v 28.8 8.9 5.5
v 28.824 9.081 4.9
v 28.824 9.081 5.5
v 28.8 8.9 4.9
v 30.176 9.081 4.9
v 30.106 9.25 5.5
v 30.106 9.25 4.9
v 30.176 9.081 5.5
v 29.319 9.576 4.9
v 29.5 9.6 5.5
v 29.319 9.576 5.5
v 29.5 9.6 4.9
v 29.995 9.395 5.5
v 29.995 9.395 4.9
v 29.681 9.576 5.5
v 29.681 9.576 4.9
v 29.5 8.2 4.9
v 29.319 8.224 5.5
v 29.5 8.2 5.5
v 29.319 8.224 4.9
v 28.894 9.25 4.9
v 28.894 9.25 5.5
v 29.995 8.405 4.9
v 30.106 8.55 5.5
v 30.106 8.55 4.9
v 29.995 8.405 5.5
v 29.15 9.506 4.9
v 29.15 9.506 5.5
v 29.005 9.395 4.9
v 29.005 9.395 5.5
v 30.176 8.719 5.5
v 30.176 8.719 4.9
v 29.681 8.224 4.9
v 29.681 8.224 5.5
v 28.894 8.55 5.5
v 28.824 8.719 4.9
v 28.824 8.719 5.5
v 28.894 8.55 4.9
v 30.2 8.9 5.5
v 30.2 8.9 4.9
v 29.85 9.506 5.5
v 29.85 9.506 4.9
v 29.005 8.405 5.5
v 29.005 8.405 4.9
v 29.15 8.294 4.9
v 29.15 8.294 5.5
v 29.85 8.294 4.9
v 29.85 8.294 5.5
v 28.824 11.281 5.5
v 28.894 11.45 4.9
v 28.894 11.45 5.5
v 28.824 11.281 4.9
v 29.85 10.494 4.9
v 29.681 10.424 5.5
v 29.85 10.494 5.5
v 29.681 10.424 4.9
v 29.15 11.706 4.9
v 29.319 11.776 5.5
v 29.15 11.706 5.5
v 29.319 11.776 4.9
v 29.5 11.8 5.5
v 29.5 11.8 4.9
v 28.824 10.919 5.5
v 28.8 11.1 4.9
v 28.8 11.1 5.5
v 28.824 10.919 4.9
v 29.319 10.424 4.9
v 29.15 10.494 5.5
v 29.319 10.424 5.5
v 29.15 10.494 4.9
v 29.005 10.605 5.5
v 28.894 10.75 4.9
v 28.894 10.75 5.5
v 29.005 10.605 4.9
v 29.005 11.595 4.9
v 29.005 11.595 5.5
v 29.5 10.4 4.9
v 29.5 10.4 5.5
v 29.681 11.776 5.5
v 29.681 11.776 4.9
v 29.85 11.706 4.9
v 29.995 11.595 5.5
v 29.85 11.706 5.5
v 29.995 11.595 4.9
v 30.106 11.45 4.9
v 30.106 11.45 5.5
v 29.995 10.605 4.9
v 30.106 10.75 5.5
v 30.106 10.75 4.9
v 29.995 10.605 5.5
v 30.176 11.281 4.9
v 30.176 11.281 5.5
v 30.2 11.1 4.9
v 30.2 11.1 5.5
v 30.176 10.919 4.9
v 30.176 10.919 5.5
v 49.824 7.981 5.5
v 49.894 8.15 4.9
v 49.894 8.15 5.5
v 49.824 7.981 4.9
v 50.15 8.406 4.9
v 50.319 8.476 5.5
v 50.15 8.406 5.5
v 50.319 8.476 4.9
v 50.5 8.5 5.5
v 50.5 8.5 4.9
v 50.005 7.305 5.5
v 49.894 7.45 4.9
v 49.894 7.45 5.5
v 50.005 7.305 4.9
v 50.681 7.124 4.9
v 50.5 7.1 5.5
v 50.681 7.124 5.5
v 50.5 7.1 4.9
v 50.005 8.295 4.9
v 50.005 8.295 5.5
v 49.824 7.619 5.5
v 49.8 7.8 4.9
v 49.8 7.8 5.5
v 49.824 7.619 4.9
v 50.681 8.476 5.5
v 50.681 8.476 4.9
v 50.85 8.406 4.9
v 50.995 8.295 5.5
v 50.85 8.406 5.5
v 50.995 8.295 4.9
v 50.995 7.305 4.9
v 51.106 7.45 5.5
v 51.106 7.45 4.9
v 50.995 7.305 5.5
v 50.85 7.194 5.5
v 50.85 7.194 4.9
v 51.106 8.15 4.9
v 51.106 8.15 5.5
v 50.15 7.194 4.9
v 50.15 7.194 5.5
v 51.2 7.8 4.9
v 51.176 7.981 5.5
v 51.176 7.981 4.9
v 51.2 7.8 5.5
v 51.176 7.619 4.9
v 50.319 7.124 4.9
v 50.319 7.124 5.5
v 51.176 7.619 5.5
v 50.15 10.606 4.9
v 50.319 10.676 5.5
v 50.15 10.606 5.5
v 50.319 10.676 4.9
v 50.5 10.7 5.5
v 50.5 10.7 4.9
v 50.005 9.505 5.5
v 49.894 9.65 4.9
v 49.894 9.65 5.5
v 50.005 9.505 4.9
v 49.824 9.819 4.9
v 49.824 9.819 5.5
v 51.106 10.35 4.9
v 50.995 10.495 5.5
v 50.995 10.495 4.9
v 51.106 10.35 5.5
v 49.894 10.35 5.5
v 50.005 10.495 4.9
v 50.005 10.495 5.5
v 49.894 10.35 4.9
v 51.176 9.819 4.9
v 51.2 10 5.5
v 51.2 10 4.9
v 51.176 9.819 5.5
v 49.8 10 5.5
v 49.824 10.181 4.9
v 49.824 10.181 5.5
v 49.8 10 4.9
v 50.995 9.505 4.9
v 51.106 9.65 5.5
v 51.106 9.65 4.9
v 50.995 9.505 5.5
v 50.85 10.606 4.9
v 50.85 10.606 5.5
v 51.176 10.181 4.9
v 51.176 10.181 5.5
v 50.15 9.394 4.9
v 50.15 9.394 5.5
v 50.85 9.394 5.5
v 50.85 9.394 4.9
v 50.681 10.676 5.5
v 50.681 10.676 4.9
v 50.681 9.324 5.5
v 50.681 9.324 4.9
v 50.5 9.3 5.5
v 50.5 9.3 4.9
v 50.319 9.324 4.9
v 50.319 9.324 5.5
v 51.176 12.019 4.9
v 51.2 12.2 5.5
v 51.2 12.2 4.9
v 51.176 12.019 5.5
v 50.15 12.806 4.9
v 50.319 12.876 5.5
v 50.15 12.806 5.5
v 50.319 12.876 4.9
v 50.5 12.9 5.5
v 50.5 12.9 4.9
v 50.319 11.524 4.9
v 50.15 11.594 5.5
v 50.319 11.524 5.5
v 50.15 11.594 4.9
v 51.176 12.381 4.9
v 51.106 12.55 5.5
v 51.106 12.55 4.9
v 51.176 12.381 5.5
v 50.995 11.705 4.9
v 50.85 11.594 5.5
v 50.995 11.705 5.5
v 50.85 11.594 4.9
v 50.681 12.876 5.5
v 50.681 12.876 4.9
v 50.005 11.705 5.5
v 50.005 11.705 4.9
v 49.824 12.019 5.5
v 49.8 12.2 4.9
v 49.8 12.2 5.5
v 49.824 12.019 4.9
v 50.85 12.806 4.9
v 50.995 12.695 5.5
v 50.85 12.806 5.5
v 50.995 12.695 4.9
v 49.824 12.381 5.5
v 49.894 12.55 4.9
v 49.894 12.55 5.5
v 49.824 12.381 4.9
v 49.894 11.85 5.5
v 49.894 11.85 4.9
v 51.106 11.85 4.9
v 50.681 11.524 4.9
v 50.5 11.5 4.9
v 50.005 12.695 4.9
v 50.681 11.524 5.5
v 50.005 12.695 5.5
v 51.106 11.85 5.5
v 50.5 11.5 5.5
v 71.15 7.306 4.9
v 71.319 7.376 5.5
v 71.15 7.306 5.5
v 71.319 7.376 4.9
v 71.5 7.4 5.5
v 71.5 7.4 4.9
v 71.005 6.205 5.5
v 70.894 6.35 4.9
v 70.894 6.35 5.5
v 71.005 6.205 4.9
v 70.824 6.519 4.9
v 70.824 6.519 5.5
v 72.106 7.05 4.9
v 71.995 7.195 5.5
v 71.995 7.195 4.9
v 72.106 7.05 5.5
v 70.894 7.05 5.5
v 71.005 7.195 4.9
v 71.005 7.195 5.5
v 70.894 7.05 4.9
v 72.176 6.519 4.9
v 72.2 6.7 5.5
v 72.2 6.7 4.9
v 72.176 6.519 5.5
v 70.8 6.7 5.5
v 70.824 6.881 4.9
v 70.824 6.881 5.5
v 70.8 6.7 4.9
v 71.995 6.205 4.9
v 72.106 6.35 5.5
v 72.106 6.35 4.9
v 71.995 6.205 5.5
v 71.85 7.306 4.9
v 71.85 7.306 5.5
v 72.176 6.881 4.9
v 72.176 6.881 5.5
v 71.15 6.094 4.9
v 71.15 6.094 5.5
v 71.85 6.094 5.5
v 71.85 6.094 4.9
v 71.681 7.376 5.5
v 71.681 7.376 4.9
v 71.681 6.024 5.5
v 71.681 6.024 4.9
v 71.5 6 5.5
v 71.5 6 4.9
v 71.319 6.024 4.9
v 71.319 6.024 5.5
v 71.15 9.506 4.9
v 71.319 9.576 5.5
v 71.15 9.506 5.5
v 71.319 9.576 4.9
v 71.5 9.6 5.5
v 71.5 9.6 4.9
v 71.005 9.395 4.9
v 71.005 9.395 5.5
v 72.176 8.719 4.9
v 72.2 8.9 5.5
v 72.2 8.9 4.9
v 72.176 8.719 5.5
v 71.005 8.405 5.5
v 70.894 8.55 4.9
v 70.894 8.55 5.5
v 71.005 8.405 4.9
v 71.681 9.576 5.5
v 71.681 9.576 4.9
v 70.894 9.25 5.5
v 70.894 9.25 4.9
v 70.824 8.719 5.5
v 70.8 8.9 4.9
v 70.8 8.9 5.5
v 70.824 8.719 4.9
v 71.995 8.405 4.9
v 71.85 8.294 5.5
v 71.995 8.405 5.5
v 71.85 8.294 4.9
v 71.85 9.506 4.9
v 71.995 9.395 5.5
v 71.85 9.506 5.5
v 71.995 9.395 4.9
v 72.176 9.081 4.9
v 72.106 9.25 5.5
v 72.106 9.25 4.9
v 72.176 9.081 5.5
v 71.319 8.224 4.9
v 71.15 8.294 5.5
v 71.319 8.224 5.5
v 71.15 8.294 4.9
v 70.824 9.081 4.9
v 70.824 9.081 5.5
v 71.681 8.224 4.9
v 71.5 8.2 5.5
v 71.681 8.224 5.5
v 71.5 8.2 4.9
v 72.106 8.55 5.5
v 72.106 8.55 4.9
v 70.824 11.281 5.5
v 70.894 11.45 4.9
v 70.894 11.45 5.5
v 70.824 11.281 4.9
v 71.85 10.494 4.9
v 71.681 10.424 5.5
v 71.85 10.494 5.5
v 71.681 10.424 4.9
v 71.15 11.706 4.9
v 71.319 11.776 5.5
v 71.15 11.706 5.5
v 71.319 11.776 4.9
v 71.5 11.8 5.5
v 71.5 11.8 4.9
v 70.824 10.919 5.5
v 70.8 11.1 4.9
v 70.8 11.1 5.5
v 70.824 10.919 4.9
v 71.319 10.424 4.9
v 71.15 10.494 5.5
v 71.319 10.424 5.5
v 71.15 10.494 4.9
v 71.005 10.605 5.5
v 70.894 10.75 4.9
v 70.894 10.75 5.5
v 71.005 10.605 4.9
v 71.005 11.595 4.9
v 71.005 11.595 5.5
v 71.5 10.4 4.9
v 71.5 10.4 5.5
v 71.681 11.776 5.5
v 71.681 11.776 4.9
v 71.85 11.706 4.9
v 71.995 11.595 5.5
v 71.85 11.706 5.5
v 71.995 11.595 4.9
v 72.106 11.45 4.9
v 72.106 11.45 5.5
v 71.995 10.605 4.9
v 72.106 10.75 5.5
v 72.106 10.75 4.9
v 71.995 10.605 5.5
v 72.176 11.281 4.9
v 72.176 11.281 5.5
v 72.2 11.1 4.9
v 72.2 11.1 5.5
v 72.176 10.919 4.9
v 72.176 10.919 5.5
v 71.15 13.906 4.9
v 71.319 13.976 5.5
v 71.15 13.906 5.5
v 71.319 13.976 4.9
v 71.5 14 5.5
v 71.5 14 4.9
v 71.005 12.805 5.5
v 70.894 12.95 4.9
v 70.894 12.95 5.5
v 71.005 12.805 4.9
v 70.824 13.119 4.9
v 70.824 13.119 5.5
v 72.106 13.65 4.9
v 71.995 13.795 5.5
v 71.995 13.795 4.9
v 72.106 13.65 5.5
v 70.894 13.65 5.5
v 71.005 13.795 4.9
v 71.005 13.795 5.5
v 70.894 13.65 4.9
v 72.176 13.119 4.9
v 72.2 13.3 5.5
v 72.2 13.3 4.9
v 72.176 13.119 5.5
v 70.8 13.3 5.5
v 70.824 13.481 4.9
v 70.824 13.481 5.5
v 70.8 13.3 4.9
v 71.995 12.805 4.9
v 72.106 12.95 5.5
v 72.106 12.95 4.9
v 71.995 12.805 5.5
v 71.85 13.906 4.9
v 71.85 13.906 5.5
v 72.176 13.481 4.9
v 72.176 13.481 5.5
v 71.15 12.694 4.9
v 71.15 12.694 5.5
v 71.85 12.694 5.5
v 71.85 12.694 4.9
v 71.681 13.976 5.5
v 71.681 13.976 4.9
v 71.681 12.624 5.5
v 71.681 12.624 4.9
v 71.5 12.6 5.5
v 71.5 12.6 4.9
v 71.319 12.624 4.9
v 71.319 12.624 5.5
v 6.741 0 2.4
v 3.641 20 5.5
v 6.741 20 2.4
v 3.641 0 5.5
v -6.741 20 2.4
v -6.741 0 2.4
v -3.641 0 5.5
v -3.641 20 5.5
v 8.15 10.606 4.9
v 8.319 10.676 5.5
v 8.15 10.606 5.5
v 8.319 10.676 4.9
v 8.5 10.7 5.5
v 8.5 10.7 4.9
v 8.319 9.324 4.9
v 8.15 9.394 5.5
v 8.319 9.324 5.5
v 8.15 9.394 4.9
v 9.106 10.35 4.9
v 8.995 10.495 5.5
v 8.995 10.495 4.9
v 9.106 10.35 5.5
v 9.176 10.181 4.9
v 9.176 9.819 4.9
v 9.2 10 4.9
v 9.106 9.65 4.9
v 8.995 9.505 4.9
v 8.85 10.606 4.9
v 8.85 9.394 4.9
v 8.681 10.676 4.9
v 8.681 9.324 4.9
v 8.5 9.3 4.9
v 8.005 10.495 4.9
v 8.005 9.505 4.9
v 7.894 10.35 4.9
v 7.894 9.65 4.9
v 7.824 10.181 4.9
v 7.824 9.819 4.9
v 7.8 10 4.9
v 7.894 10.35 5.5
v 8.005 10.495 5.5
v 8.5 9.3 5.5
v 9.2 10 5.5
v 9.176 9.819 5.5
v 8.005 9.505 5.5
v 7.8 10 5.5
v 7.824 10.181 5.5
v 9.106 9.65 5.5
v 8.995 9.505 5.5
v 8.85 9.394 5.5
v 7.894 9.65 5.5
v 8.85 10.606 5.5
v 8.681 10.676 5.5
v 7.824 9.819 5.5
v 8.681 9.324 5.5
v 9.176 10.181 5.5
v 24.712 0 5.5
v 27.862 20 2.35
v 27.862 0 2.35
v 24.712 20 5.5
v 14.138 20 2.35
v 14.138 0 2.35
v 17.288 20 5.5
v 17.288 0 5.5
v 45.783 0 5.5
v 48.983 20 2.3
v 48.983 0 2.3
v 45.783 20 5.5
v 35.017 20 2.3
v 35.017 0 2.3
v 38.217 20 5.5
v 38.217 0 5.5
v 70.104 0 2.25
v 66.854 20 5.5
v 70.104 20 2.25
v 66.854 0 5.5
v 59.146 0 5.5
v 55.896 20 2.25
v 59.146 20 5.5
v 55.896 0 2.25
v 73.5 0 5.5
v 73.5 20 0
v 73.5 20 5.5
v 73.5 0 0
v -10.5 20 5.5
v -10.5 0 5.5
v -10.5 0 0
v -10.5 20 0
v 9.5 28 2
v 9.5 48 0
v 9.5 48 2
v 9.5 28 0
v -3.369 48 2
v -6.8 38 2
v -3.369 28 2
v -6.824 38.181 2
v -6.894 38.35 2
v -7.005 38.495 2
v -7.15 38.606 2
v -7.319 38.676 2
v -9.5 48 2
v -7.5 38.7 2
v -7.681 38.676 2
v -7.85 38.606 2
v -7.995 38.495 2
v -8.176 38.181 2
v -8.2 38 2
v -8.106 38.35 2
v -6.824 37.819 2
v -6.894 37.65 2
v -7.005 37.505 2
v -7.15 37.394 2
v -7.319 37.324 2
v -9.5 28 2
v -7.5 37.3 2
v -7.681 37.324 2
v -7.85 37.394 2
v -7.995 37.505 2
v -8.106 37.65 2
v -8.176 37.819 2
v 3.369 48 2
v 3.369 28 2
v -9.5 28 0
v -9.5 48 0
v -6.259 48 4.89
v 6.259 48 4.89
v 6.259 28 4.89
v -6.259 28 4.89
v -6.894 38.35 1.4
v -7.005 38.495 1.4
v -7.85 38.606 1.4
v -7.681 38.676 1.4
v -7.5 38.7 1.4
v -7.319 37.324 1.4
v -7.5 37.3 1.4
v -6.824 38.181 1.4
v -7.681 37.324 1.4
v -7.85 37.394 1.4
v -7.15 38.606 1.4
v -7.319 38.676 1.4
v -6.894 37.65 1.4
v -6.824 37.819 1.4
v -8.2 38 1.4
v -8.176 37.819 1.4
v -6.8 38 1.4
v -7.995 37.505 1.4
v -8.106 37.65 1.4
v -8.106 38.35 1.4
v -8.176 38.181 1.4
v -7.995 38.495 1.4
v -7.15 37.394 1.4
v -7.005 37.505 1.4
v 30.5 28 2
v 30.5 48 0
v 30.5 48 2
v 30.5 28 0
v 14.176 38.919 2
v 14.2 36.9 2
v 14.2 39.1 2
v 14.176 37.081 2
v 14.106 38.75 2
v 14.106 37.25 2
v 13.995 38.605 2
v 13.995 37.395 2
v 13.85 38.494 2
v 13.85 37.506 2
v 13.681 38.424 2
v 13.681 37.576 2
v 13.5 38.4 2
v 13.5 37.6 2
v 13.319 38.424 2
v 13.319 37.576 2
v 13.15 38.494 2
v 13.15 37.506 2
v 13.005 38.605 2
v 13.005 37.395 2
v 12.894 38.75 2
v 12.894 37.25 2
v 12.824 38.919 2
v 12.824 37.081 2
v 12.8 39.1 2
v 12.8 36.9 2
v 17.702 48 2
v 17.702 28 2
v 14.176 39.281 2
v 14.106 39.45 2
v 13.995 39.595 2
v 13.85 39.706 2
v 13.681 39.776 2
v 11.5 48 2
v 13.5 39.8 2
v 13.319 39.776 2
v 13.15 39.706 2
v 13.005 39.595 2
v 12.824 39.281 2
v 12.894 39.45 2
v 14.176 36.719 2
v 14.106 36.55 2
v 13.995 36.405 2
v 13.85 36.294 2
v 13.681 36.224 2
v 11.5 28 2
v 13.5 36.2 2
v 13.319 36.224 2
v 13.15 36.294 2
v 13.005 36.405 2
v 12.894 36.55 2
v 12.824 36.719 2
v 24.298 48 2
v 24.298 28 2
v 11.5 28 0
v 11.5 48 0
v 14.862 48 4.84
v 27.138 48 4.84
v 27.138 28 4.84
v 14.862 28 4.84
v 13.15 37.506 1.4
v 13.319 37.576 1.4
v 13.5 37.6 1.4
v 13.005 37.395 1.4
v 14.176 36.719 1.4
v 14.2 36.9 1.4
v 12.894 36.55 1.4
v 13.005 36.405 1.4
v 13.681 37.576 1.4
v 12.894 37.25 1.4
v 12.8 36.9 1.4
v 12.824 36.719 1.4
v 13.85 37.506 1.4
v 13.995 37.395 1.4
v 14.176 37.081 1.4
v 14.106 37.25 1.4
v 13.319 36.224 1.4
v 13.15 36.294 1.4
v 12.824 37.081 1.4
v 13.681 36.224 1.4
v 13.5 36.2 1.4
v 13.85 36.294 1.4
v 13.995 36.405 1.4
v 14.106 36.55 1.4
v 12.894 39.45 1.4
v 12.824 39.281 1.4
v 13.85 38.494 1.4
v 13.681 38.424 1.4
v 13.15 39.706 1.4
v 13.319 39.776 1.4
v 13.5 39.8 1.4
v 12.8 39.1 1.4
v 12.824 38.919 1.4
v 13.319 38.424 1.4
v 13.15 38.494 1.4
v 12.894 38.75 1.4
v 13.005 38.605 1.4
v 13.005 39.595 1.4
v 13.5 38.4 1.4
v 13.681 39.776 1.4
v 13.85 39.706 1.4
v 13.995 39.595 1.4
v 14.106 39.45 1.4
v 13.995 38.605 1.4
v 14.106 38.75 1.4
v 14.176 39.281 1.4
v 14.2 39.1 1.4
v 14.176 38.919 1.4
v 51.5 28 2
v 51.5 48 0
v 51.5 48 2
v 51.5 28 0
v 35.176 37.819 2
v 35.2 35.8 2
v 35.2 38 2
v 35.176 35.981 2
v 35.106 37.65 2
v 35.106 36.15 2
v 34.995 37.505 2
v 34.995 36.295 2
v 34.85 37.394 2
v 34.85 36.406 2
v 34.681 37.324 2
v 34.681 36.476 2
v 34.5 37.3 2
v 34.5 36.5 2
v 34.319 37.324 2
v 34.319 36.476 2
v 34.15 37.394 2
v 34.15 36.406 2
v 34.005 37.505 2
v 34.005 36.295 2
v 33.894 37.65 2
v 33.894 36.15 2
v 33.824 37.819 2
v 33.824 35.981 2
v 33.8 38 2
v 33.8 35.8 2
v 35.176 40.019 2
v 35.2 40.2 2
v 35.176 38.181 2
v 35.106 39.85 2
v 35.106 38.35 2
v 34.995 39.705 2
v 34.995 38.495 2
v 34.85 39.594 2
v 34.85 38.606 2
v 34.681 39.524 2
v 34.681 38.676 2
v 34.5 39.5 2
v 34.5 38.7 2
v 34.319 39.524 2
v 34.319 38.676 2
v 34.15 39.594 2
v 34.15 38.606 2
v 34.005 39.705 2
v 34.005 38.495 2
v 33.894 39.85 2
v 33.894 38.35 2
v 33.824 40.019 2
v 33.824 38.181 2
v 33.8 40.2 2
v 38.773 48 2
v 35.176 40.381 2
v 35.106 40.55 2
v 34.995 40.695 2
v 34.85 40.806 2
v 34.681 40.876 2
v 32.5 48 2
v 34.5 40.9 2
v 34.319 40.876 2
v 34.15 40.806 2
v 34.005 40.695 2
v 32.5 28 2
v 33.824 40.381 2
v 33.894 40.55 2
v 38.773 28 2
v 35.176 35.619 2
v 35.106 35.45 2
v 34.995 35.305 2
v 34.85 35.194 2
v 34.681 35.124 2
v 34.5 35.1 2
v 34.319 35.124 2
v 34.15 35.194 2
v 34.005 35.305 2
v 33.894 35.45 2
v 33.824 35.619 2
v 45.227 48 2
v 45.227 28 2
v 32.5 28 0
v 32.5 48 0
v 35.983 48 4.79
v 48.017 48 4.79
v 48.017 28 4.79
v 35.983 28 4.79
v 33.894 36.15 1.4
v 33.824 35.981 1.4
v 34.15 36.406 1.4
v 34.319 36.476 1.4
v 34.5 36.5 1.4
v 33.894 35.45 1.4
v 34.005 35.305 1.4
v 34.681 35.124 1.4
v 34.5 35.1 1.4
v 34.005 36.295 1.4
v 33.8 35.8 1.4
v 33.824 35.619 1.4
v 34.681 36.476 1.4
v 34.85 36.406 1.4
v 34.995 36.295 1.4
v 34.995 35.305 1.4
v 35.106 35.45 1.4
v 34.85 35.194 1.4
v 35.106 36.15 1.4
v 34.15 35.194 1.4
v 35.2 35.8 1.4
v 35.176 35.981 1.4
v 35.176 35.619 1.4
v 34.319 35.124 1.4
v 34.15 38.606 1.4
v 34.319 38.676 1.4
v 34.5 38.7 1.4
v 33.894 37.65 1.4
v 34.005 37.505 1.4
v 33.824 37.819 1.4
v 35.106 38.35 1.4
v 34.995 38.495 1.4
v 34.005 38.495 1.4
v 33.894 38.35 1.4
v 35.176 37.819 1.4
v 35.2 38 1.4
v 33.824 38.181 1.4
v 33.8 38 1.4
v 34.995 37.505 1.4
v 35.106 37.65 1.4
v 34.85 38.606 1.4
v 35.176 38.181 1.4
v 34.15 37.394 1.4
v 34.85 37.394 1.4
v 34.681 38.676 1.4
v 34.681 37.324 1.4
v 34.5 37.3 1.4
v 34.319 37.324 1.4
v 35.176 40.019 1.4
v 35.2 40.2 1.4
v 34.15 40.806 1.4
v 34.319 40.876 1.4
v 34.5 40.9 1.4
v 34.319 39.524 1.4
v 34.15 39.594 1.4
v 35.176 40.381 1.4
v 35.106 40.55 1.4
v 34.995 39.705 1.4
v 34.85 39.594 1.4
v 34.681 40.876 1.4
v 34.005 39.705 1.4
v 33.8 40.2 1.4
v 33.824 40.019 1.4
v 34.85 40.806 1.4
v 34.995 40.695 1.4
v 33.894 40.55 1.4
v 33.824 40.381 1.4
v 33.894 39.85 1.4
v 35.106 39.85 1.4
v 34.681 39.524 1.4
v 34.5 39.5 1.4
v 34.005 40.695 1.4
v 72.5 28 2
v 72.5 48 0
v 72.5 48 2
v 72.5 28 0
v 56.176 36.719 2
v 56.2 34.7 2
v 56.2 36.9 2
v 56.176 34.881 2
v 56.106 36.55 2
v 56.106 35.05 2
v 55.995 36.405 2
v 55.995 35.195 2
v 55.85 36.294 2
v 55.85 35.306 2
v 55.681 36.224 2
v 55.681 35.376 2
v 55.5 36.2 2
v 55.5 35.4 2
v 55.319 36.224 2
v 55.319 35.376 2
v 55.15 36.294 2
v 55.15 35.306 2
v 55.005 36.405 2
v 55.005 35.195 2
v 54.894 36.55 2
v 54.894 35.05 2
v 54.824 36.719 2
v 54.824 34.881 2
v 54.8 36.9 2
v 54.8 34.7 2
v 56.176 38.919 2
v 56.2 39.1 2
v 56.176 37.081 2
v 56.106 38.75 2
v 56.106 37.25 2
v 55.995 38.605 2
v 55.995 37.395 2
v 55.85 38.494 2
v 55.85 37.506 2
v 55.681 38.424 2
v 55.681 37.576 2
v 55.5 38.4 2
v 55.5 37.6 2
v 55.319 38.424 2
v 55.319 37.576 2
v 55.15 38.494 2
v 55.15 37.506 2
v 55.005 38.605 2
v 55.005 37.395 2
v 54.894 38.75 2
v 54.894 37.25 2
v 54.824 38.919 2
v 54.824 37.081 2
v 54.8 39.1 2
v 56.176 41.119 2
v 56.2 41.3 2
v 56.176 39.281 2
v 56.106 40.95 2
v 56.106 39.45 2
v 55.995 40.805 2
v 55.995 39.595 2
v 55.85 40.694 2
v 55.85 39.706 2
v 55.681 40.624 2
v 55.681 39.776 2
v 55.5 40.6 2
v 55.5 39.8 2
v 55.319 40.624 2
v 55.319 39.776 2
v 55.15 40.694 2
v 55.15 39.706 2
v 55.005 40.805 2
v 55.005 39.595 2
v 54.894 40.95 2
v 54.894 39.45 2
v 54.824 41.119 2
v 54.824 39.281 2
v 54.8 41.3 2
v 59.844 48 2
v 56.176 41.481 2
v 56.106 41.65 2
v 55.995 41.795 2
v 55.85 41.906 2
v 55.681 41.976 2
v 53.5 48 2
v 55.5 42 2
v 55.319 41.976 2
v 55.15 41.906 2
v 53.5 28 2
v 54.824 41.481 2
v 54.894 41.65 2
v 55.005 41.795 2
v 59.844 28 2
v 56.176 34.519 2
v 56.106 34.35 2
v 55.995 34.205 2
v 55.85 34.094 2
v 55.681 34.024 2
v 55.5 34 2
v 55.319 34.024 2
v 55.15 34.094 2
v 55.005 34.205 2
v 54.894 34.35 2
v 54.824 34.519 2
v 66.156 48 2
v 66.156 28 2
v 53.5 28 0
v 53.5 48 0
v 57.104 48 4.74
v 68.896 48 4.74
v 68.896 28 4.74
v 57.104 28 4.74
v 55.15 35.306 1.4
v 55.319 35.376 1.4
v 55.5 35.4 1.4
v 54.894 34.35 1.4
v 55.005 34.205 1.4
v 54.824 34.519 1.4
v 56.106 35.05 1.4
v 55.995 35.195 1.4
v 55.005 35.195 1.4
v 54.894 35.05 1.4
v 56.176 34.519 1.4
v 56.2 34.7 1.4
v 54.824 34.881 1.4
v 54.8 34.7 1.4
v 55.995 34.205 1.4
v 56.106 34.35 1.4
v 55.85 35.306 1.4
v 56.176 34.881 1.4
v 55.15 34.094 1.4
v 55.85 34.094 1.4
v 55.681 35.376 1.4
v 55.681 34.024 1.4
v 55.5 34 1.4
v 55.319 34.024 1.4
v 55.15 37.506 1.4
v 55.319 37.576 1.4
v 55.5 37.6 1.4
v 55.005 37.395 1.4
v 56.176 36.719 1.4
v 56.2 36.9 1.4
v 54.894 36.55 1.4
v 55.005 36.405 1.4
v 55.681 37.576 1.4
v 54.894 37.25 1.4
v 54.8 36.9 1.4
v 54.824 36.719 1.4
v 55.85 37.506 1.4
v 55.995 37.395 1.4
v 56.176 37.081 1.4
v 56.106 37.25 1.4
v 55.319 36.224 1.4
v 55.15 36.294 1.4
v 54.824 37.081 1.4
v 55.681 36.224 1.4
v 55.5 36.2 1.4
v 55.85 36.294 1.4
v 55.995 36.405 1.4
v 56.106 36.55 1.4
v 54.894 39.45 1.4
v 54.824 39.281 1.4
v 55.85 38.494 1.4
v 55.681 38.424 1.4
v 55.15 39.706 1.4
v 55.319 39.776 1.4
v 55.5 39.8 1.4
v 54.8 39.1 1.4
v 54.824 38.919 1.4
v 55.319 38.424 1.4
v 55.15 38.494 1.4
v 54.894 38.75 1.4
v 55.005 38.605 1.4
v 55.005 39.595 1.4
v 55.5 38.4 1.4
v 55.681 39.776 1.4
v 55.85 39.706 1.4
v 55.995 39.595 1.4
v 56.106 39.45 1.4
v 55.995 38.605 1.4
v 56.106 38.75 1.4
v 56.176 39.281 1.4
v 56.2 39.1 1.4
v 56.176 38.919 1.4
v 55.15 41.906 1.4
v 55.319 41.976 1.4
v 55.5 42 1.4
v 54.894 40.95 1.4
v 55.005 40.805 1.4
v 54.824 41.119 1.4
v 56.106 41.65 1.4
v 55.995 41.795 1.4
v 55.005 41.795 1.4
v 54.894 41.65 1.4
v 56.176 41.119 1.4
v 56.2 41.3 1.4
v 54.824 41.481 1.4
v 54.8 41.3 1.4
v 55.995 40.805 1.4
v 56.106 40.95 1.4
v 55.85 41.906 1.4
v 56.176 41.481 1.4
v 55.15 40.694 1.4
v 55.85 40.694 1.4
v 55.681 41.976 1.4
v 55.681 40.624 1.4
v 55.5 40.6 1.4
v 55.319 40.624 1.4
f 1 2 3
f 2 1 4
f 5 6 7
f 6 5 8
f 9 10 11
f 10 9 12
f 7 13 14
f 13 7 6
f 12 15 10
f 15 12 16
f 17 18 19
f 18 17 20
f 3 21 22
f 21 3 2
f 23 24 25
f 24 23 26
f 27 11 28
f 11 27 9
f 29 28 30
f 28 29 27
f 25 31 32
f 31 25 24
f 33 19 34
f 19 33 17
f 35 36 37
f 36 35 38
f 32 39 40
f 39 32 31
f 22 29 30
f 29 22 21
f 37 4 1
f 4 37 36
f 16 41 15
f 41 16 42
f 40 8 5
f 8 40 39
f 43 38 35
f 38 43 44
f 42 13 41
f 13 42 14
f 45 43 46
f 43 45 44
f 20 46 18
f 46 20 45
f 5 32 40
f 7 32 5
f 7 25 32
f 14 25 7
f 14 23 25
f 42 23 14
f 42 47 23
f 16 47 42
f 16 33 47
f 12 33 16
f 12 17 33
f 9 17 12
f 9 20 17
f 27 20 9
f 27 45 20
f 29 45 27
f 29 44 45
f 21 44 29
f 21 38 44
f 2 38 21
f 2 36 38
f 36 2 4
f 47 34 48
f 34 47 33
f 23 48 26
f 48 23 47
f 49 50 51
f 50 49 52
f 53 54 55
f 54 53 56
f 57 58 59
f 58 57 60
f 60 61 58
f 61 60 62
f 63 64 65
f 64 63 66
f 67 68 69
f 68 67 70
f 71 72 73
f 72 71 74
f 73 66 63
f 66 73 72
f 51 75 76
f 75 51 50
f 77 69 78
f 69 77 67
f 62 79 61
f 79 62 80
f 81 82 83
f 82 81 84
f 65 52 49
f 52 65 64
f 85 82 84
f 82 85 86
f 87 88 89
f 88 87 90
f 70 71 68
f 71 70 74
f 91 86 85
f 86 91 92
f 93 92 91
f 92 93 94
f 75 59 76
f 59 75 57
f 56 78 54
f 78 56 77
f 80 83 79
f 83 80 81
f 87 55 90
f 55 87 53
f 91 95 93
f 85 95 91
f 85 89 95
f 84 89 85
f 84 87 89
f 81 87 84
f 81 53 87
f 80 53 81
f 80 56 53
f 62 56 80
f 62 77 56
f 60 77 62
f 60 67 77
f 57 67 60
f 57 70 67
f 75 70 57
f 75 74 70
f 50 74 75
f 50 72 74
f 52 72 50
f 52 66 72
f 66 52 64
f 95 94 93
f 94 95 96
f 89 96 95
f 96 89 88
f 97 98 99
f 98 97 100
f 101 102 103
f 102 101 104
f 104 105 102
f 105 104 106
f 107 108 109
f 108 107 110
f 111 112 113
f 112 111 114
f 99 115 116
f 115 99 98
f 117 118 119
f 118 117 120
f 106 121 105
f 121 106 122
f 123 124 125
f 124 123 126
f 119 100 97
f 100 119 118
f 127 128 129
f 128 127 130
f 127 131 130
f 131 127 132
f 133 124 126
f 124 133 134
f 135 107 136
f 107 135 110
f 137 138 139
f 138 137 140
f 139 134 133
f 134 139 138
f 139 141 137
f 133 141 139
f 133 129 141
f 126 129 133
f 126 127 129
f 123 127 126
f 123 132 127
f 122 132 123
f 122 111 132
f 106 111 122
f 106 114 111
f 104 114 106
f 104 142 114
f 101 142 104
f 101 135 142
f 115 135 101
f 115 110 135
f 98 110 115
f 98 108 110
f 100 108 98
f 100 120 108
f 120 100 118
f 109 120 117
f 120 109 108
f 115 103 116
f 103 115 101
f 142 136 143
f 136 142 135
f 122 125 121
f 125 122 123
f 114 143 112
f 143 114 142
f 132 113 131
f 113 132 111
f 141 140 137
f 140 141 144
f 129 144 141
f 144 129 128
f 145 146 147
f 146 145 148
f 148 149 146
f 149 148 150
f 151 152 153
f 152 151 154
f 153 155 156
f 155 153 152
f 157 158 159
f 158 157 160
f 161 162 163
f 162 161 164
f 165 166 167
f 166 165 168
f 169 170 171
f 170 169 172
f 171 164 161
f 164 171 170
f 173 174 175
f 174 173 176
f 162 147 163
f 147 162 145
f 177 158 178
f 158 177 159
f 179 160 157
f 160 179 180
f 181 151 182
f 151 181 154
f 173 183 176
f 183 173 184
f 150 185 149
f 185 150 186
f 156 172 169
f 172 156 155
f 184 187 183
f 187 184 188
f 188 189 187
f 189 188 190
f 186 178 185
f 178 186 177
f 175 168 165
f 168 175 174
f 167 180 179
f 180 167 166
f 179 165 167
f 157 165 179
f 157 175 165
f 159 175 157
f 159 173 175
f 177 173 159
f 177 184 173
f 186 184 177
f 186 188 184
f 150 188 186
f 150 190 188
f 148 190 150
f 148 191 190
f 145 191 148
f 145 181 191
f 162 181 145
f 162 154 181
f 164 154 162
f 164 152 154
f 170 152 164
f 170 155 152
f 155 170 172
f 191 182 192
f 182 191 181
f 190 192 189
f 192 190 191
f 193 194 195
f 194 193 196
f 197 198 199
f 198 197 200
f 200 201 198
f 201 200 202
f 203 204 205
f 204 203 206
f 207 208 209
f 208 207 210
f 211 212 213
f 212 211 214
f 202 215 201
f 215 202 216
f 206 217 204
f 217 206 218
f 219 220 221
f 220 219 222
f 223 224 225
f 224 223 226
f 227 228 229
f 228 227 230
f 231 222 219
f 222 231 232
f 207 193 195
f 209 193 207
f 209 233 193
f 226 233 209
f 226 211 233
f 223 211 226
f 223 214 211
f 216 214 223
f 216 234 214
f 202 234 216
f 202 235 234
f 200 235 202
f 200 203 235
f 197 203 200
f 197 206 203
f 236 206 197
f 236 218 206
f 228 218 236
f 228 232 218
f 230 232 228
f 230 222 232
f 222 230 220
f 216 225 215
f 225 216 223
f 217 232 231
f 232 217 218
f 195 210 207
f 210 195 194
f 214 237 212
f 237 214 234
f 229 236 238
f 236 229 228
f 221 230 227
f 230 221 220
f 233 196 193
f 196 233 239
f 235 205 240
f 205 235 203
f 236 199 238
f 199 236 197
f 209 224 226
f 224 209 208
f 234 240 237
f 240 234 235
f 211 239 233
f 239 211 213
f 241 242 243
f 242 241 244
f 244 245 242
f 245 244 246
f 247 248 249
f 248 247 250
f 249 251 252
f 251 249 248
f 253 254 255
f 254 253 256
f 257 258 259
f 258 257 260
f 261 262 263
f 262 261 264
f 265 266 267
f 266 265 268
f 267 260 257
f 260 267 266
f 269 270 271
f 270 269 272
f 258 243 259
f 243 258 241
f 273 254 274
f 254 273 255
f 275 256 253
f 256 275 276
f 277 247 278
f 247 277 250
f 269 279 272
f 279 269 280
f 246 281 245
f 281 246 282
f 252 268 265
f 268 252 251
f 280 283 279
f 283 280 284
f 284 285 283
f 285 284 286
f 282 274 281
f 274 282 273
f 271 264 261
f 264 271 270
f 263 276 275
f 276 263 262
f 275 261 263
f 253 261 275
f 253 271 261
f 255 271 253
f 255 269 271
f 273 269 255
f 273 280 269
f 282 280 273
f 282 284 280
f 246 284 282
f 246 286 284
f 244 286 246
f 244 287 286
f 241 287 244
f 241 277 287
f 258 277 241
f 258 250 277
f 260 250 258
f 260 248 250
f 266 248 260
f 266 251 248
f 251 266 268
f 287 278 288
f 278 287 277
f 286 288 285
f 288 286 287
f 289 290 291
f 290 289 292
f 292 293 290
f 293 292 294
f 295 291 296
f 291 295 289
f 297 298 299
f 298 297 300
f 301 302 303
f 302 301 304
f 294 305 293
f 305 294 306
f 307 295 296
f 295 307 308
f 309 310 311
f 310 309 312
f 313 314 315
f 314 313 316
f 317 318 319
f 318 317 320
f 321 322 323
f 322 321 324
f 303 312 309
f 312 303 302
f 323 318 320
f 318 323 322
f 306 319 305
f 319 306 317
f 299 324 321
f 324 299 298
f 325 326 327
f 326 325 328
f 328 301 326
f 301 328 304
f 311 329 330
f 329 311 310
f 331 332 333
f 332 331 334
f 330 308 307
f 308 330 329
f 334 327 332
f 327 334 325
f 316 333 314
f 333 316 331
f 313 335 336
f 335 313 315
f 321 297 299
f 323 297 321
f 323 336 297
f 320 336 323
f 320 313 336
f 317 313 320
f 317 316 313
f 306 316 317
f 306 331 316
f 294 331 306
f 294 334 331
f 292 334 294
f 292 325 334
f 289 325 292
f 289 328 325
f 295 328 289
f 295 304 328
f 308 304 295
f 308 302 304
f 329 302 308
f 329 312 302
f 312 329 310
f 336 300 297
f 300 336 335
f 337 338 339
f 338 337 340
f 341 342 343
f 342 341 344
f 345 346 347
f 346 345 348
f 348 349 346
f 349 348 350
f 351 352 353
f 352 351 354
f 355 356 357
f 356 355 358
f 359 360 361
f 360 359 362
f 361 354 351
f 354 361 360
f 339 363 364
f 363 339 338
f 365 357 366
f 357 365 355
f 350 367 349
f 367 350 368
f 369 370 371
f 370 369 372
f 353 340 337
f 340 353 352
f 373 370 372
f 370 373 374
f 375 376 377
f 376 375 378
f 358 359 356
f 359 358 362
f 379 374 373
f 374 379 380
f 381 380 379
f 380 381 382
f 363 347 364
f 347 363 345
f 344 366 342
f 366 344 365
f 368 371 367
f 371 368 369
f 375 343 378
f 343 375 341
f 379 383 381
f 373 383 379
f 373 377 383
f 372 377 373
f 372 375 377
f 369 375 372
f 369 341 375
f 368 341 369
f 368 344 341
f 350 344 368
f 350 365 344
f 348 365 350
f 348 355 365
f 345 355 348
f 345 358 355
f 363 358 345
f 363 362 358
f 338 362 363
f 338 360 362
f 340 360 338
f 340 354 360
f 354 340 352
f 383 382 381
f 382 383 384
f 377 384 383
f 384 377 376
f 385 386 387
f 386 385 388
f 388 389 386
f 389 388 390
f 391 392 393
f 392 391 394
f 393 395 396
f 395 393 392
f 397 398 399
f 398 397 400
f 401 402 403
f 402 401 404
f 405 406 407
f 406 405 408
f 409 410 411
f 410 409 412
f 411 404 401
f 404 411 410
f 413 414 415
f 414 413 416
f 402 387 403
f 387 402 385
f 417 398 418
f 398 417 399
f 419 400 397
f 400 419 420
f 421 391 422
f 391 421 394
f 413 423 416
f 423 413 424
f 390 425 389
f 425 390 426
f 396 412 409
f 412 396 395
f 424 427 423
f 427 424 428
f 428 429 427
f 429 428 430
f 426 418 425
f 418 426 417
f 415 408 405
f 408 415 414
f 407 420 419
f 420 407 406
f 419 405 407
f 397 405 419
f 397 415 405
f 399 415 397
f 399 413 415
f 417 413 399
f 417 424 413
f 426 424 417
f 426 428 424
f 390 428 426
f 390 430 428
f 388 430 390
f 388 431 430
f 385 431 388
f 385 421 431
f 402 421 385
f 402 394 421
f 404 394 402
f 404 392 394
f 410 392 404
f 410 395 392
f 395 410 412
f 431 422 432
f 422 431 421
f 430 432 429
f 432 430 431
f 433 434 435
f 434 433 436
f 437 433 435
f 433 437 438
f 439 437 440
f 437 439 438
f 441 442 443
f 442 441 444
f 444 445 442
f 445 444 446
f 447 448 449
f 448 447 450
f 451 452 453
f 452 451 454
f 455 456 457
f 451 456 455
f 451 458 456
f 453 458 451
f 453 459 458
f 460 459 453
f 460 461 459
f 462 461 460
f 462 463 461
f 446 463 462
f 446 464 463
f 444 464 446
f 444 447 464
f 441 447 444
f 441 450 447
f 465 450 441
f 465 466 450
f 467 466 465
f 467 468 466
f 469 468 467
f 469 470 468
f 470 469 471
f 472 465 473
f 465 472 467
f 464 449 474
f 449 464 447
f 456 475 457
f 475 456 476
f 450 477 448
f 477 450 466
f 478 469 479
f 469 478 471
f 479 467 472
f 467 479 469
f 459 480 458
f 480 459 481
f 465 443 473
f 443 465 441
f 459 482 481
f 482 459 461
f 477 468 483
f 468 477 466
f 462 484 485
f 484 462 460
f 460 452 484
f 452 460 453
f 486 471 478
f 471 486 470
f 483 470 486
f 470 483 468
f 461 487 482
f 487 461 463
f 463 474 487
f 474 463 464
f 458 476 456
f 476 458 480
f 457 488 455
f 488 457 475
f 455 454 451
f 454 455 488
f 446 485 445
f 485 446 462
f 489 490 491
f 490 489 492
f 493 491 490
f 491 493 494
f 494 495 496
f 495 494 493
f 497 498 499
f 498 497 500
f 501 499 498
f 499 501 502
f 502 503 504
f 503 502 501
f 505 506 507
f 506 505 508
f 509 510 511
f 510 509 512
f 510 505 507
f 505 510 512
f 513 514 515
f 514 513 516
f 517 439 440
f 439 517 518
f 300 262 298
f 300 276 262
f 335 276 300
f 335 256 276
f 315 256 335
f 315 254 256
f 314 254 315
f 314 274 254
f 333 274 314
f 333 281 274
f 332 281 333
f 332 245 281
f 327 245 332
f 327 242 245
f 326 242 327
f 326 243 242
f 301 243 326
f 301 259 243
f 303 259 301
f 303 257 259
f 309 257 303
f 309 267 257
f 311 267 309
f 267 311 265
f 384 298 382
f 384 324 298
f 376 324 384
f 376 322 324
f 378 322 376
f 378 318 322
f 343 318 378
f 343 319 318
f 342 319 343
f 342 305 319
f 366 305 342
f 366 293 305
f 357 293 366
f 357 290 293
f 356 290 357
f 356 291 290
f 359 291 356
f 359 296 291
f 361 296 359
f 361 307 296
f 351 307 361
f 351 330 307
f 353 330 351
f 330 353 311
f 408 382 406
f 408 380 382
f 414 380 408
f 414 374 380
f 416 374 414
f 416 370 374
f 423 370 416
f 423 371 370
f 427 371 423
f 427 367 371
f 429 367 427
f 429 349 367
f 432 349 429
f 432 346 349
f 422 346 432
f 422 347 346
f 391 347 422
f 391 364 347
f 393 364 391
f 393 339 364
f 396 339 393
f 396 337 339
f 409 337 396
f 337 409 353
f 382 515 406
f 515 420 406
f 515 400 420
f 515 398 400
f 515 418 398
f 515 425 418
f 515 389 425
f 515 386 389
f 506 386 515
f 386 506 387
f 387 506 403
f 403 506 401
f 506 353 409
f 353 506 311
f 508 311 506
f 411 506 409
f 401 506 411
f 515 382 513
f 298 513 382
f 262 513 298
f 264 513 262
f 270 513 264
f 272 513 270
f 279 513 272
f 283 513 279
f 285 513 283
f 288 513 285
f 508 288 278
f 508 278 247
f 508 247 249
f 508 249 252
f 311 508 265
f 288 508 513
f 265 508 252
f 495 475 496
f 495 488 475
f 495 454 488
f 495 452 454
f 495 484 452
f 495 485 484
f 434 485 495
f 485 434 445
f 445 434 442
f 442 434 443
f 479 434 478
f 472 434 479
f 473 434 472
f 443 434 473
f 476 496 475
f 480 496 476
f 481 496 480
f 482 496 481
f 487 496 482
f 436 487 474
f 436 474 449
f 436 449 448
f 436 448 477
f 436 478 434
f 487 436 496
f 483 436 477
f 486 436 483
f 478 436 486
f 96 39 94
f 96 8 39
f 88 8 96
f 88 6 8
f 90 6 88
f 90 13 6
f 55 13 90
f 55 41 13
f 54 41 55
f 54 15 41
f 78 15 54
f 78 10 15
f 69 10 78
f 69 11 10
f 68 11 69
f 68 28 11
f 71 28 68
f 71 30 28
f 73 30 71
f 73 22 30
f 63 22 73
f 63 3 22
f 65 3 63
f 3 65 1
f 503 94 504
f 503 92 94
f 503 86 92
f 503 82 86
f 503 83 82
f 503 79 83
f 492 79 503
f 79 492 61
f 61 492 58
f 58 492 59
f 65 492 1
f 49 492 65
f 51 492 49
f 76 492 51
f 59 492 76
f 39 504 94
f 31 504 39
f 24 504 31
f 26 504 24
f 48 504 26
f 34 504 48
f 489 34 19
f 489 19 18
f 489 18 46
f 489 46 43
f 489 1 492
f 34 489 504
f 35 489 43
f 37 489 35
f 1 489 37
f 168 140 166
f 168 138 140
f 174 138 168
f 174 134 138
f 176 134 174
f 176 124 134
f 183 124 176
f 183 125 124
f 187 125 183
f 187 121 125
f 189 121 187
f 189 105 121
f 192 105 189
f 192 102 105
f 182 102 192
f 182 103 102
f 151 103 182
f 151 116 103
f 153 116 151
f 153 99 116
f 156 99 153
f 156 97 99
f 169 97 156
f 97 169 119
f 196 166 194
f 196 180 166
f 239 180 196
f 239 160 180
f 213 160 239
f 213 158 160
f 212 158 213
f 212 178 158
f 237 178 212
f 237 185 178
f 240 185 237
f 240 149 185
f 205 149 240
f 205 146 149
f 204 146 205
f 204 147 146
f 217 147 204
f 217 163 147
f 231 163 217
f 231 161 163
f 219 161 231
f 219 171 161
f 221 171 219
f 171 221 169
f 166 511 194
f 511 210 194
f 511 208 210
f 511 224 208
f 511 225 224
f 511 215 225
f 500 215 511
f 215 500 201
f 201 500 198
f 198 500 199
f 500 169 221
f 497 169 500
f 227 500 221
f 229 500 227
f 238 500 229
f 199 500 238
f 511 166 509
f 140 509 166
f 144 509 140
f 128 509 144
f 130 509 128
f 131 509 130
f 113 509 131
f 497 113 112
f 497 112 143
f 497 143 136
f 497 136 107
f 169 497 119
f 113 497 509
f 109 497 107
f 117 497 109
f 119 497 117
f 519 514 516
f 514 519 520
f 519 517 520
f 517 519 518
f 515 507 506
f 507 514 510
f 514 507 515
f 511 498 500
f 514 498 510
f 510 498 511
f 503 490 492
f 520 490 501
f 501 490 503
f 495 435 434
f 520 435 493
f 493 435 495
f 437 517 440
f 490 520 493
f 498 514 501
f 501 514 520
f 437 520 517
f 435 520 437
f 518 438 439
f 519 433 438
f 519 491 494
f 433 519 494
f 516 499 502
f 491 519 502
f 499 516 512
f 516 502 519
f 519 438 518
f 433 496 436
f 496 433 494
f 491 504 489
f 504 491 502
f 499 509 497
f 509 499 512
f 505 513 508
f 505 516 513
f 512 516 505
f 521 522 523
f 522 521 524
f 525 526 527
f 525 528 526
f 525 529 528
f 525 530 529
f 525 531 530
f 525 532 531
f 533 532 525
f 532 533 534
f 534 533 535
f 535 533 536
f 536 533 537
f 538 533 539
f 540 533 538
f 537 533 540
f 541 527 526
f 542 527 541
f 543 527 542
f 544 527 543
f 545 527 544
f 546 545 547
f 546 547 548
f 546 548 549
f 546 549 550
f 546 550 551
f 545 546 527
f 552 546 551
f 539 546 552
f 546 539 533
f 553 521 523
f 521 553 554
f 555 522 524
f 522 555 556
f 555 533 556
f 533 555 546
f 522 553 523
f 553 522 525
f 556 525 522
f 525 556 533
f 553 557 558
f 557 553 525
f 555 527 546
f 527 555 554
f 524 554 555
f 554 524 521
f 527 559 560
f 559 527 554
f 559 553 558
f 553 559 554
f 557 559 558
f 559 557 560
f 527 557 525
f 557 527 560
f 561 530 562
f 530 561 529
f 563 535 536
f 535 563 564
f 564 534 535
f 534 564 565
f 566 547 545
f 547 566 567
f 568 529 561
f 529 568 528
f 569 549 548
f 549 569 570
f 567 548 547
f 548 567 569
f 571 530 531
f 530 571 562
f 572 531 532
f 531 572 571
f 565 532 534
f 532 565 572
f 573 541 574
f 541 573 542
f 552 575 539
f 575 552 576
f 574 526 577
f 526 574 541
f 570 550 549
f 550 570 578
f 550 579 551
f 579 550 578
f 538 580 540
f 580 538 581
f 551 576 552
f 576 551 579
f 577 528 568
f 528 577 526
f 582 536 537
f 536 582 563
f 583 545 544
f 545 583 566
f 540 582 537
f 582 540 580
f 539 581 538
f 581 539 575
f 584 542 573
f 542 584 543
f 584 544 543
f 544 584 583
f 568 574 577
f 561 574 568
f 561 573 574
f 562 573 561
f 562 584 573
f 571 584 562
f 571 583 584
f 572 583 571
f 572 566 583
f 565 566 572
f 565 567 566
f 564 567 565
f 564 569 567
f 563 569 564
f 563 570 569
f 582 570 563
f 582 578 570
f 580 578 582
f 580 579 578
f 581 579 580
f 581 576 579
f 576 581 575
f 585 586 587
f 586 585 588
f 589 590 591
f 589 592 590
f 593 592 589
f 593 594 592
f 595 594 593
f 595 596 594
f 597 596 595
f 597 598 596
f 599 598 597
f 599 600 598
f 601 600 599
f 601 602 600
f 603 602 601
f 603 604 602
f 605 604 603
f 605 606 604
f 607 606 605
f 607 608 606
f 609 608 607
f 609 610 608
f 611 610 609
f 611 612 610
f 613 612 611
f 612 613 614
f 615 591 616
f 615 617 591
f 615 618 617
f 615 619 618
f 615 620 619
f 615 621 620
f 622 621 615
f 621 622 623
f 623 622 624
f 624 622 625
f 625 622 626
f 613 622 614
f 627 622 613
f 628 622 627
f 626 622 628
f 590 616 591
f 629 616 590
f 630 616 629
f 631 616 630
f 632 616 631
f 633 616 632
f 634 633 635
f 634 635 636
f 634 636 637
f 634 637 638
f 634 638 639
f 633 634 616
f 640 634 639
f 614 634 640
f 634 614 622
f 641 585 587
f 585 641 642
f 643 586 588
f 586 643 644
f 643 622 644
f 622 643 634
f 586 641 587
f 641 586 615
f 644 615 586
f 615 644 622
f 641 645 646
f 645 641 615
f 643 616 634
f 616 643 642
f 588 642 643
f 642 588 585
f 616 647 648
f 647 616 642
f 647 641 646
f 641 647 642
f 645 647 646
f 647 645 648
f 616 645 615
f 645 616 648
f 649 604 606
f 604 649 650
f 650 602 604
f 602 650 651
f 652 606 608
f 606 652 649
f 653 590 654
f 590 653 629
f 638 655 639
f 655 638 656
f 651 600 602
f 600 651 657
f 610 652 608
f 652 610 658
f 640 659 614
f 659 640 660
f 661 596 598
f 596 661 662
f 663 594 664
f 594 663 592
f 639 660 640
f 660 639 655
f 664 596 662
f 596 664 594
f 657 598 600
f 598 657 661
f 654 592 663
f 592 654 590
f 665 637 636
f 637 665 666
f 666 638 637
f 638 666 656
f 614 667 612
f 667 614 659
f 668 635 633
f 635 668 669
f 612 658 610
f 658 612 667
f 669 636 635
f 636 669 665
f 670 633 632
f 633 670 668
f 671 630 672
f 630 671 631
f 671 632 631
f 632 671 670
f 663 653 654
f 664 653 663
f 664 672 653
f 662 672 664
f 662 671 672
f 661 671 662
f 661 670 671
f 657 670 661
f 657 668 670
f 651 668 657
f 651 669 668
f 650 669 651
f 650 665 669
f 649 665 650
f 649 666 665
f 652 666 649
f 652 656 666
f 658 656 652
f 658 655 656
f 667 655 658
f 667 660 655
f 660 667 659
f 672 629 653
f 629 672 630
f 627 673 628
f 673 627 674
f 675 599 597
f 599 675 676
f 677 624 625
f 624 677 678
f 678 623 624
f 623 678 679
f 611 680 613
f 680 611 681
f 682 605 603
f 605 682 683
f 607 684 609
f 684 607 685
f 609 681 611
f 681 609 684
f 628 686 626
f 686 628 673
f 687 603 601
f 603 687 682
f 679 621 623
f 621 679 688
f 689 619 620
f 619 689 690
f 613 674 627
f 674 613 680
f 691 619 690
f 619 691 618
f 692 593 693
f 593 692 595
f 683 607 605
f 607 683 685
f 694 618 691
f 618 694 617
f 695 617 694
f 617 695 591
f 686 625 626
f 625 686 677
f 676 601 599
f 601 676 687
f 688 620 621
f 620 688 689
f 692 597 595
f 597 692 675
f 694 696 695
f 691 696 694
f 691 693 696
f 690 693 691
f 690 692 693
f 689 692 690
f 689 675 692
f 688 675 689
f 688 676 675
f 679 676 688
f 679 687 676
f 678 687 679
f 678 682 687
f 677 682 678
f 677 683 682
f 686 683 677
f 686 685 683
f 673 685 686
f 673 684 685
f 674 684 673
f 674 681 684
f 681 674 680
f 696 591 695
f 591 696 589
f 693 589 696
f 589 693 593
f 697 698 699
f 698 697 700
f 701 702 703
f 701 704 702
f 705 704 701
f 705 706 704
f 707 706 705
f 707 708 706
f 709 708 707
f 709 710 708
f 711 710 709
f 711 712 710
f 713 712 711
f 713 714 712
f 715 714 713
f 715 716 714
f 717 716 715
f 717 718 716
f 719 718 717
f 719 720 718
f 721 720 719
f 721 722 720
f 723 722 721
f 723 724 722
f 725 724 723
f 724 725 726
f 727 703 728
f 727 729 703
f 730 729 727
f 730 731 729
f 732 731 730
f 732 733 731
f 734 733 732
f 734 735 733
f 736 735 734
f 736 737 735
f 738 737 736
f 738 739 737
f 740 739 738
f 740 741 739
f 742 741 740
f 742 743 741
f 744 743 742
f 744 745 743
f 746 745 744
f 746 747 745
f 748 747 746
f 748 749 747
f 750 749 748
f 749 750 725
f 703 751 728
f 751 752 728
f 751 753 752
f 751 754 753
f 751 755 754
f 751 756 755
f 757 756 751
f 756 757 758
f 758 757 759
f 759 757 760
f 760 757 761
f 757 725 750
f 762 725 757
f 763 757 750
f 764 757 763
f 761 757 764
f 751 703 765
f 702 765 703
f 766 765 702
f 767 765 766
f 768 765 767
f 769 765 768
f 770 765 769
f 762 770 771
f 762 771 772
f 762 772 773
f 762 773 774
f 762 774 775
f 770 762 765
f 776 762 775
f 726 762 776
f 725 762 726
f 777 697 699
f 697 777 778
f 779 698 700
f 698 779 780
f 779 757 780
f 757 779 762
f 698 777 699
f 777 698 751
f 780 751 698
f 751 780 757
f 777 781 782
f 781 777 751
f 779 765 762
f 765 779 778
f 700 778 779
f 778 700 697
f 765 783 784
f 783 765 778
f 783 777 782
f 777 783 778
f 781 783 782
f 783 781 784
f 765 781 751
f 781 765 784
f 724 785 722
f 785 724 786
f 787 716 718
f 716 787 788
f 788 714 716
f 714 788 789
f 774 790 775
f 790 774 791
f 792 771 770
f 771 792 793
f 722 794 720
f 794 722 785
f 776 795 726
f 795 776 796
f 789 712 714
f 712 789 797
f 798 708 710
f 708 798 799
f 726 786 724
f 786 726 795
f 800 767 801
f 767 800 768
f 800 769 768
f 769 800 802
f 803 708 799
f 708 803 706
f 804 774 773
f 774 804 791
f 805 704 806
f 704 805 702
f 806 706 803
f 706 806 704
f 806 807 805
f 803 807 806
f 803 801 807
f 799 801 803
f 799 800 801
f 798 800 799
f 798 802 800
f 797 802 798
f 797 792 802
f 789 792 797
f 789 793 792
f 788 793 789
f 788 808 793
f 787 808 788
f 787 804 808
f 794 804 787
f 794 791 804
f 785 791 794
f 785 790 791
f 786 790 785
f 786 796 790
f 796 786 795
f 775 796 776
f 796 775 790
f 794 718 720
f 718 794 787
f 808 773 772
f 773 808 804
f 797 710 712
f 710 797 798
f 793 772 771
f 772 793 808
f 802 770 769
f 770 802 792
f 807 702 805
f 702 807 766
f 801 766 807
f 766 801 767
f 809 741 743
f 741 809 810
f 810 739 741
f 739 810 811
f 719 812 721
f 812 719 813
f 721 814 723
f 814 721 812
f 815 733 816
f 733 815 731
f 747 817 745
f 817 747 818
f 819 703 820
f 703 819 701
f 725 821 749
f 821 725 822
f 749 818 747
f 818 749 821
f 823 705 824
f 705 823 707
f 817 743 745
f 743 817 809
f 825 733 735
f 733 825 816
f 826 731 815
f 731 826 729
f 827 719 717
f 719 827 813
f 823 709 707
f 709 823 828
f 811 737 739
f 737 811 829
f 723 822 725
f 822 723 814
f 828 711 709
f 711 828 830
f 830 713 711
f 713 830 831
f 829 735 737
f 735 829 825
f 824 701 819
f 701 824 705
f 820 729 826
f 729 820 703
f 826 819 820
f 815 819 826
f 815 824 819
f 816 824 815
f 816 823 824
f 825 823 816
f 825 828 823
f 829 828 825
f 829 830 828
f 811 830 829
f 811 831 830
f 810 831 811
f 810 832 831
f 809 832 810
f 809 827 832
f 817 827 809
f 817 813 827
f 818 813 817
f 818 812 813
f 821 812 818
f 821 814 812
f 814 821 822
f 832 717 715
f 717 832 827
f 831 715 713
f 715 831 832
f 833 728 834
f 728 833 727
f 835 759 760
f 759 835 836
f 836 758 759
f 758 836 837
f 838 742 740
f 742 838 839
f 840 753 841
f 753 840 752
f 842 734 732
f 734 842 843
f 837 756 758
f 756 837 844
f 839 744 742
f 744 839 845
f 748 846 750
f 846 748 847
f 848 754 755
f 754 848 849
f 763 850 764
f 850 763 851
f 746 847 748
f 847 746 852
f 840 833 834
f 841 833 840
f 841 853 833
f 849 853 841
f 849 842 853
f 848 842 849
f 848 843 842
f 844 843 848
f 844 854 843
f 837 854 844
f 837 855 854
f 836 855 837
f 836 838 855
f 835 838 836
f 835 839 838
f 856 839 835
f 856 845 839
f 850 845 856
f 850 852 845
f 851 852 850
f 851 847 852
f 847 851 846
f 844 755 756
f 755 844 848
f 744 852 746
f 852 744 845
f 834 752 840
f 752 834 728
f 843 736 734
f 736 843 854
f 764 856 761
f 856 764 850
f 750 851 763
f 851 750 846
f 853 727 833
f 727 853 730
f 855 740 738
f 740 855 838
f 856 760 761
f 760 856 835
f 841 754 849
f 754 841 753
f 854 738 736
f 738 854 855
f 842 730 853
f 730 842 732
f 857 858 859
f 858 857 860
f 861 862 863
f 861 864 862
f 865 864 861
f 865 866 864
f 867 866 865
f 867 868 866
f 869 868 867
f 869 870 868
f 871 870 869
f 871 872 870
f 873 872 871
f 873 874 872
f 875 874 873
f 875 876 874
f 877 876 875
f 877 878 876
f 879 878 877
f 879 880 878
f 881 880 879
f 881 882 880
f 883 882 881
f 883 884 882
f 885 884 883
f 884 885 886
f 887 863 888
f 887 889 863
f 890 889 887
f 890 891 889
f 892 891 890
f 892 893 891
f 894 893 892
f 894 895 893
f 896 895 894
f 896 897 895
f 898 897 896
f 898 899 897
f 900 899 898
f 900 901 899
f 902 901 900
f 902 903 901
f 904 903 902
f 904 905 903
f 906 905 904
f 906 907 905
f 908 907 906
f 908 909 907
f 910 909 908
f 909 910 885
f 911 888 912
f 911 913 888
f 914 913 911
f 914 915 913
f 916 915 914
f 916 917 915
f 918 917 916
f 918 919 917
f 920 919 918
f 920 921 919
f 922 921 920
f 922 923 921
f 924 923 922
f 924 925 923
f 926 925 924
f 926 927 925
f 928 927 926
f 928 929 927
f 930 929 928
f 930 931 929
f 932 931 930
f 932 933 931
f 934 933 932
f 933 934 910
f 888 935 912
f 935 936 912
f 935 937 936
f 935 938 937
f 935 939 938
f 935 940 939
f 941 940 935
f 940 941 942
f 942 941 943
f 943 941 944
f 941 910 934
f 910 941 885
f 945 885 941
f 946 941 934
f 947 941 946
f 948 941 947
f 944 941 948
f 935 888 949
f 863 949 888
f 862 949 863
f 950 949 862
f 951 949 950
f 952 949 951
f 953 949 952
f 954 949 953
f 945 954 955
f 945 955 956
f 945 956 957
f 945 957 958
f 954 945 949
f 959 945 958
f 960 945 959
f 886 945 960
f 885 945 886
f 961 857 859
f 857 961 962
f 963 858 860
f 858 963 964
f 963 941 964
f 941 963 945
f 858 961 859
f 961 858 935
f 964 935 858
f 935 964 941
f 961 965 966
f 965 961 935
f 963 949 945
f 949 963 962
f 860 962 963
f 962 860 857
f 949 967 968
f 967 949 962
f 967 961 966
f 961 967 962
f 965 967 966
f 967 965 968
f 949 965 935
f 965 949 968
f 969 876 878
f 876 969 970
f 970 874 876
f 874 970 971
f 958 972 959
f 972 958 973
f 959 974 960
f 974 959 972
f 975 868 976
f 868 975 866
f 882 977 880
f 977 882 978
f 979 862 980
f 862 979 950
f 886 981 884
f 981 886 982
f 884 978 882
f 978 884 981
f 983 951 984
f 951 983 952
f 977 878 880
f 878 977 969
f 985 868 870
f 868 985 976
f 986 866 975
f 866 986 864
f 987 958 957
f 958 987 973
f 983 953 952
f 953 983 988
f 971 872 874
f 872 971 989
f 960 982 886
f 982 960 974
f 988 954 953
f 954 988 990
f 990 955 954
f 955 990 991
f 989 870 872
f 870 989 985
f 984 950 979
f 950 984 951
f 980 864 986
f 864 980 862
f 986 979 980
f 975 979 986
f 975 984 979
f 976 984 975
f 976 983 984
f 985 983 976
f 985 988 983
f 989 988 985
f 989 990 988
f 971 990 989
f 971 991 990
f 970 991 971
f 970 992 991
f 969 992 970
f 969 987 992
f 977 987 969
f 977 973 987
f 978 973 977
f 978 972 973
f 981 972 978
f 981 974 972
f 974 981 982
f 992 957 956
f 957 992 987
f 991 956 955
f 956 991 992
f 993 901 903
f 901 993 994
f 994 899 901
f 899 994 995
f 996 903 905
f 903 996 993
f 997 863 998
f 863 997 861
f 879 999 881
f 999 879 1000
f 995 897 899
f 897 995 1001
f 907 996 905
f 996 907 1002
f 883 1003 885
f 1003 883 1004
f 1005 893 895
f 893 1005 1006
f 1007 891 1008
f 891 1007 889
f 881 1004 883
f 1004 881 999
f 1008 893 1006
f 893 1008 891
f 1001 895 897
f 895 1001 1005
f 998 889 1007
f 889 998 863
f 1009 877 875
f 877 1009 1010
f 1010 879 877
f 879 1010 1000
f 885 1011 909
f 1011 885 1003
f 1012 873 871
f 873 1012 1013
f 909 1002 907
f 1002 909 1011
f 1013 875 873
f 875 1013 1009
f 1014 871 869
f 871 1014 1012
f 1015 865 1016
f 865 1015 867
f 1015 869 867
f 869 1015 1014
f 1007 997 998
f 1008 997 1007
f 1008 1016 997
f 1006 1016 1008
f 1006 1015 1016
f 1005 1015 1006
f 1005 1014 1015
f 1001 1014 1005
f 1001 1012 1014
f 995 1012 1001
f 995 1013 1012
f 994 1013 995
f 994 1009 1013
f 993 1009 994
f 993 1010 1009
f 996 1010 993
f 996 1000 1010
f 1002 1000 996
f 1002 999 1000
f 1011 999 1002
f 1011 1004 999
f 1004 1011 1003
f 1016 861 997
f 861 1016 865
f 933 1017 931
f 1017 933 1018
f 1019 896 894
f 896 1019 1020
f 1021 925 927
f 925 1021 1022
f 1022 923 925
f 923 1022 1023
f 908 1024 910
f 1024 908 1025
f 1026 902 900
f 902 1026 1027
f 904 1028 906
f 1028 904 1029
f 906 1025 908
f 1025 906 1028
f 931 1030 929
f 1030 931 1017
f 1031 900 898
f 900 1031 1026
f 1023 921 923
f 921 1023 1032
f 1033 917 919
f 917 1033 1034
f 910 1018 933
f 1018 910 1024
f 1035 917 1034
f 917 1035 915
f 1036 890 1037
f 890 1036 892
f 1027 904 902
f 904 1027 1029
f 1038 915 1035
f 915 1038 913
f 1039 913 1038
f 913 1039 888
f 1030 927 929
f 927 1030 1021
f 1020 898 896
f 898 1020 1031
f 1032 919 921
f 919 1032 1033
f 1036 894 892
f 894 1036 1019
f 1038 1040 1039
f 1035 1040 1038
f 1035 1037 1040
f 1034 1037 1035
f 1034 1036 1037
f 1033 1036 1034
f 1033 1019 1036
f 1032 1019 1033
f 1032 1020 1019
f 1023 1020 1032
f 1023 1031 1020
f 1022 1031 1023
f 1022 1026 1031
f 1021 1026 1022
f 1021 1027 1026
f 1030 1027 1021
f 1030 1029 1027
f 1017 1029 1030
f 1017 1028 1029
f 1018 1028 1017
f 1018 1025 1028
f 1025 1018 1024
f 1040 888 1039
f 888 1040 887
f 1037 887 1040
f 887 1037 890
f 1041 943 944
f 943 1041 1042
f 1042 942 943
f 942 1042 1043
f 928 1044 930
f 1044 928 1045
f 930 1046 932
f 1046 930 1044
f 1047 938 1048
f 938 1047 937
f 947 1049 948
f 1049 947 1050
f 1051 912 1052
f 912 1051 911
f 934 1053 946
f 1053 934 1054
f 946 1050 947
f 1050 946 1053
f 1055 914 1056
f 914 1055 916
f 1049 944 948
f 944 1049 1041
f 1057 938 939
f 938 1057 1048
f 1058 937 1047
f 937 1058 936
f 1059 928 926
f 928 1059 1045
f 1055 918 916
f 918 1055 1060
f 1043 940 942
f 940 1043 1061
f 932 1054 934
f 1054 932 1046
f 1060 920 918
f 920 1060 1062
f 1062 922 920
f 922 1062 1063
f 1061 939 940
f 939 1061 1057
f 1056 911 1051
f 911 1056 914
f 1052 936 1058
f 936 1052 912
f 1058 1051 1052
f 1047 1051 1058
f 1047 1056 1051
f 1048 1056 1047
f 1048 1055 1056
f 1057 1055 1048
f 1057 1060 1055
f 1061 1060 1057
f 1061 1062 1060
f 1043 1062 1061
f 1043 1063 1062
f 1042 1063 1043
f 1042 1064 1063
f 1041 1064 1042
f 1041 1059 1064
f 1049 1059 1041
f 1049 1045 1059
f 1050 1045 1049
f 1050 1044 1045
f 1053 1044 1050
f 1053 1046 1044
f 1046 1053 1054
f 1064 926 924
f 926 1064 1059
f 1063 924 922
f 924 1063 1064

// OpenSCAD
// Fit test coupon: ONE short print (~15 min) shows which clearance works on THIS printer
// with THIS filament - before printing the real part.
// A block with 4 dovetail grooves (clearance 0.2 / 0.3 / 0.4 / 0.5 mm per side) plus 4 tongues.
// Number of engraved dots on block and tongue = variant 1..4.
// Copy the real part's profile (height, widths, flanks) here so the test means something.
// Prints without supports: block flat with the grooves open at the top, tongues on their base plate.

/* [Coupon] */
// Clearance per side for the 4 variants
fits = [0.2, 0.3, 0.4, 0.5];
// Dovetail height
dt_h = 3.0;
// Dovetail width at the root (narrow side)
dt_bot = 7.0;
// Dovetail width at the tip (dt_bot + 2*dt_h = 45 deg)
dt_top = 13.0;
// Length of the test pieces
len = 20;
// What to print
part = "all"; // [all, block, tongues]

/* [Hidden] */
$fn = 24;
pitch = dt_top + 8;
bh = dt_h + 2.5;          // block height
// Profile in (u, v): v = 0 root (narrow), v = dt_h tip (wide); extended to v = -1 for clean unions
module prof(grow) {
    k = (dt_top - dt_bot) / (2 * dt_h);
    offset(delta = grow) polygon([[-dt_bot/2 + k, -1], [dt_bot/2 - k, -1], [dt_top/2, dt_h], [-dt_top/2, dt_h]]);
}
// n dots engraved 0.6 mm deep into a surface at height `top`
module dots(n, top) for (i = [0 : n - 1]) translate([i * 2.2 - (n - 1) * 1.1, 0, top - 0.6]) cylinder(d = 1.4, h = 1);

// Block: groove mouth (narrow) at the top, widening downwards (v -> -z)
module block() difference() {
    translate([-pitch/2, 0, 0]) cube([pitch * len(fits), len, bh]);
    for (i = [0 : len(fits) - 1]) {
        translate([i * pitch, -1, bh]) rotate([-90, 0, 0]) linear_extrude(len + 2) prof(fits[i] / 2);
        translate([i * pitch + dt_top/2 + 2, len / 2, 0]) rotate([0, 0, 90]) dots(i + 1, bh);
    }
}
// Tongue: base plate on the bed, root at z = 2, widening upwards (v -> +z)
module tongue(i) difference() {
    union() {
        translate([-pitch/2 + 1, 0, 0]) cube([pitch - 2, len, 2]);
        translate([0, len, 2 - 0.01]) rotate([90, 0, 0]) linear_extrude(len) prof(-fits[i] / 2);
    }
    translate([-pitch/2 + 3, len / 2, 0]) rotate([0, 0, 90]) dots(i + 1, 2);
}
// Only draw for known values, so `part="none"` (used by check.sh) draws nothing
if (part == "all" || part == "block") block();
if (part == "all" || part == "tongues") for (i = [0 : len(fits) - 1]) translate([i * pitch, len + 8, 0]) tongue(i);
